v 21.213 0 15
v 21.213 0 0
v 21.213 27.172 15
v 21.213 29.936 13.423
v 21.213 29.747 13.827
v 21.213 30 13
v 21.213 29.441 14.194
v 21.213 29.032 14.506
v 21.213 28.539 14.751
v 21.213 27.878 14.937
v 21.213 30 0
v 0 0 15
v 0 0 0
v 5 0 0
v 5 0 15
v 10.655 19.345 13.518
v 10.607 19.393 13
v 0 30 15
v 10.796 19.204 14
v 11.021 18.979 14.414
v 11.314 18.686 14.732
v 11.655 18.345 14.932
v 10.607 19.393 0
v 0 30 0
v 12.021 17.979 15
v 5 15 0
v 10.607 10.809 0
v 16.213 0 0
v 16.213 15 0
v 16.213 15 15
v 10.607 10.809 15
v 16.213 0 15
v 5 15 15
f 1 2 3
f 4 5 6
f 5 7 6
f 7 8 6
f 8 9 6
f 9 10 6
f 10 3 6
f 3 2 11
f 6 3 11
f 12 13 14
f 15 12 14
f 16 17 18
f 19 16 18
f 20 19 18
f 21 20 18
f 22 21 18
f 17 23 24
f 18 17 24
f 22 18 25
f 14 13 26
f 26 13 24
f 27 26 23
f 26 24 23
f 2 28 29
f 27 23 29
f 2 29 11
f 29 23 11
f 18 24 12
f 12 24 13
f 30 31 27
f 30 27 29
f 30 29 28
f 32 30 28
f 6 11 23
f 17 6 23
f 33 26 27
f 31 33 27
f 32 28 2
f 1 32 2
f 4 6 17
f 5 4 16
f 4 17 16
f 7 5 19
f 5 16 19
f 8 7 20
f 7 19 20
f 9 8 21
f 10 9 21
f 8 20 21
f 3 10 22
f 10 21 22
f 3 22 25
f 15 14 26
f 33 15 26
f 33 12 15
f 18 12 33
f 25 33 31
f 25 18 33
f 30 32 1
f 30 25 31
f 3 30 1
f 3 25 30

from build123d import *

# Parameters (mm, degrees)
F1_DEPTH = 15
F2_R     = 2


with BuildPart() as f1:
    # F0 (on Top) → F1 (new body)
    with BuildSketch(Plane.XY):
        Polygon((0, 30), (0, 0), (5, 0), (5, 15), (10.606602, 10.808817), (16.213203, 15), (16.213203, 0), (21.213203, 0), (21.213203, 30), (10.606602, 19.393398), align=None)
    extrude(amount=F1_DEPTH)

    # F2
    f2_edges = [f1.edges().sort_by_distance(p)[0] for p in [
        (15.909903, 24.696699, 15),
    ]]
    fillet(f2_edges, radius=F2_R)


solid = f1.part
